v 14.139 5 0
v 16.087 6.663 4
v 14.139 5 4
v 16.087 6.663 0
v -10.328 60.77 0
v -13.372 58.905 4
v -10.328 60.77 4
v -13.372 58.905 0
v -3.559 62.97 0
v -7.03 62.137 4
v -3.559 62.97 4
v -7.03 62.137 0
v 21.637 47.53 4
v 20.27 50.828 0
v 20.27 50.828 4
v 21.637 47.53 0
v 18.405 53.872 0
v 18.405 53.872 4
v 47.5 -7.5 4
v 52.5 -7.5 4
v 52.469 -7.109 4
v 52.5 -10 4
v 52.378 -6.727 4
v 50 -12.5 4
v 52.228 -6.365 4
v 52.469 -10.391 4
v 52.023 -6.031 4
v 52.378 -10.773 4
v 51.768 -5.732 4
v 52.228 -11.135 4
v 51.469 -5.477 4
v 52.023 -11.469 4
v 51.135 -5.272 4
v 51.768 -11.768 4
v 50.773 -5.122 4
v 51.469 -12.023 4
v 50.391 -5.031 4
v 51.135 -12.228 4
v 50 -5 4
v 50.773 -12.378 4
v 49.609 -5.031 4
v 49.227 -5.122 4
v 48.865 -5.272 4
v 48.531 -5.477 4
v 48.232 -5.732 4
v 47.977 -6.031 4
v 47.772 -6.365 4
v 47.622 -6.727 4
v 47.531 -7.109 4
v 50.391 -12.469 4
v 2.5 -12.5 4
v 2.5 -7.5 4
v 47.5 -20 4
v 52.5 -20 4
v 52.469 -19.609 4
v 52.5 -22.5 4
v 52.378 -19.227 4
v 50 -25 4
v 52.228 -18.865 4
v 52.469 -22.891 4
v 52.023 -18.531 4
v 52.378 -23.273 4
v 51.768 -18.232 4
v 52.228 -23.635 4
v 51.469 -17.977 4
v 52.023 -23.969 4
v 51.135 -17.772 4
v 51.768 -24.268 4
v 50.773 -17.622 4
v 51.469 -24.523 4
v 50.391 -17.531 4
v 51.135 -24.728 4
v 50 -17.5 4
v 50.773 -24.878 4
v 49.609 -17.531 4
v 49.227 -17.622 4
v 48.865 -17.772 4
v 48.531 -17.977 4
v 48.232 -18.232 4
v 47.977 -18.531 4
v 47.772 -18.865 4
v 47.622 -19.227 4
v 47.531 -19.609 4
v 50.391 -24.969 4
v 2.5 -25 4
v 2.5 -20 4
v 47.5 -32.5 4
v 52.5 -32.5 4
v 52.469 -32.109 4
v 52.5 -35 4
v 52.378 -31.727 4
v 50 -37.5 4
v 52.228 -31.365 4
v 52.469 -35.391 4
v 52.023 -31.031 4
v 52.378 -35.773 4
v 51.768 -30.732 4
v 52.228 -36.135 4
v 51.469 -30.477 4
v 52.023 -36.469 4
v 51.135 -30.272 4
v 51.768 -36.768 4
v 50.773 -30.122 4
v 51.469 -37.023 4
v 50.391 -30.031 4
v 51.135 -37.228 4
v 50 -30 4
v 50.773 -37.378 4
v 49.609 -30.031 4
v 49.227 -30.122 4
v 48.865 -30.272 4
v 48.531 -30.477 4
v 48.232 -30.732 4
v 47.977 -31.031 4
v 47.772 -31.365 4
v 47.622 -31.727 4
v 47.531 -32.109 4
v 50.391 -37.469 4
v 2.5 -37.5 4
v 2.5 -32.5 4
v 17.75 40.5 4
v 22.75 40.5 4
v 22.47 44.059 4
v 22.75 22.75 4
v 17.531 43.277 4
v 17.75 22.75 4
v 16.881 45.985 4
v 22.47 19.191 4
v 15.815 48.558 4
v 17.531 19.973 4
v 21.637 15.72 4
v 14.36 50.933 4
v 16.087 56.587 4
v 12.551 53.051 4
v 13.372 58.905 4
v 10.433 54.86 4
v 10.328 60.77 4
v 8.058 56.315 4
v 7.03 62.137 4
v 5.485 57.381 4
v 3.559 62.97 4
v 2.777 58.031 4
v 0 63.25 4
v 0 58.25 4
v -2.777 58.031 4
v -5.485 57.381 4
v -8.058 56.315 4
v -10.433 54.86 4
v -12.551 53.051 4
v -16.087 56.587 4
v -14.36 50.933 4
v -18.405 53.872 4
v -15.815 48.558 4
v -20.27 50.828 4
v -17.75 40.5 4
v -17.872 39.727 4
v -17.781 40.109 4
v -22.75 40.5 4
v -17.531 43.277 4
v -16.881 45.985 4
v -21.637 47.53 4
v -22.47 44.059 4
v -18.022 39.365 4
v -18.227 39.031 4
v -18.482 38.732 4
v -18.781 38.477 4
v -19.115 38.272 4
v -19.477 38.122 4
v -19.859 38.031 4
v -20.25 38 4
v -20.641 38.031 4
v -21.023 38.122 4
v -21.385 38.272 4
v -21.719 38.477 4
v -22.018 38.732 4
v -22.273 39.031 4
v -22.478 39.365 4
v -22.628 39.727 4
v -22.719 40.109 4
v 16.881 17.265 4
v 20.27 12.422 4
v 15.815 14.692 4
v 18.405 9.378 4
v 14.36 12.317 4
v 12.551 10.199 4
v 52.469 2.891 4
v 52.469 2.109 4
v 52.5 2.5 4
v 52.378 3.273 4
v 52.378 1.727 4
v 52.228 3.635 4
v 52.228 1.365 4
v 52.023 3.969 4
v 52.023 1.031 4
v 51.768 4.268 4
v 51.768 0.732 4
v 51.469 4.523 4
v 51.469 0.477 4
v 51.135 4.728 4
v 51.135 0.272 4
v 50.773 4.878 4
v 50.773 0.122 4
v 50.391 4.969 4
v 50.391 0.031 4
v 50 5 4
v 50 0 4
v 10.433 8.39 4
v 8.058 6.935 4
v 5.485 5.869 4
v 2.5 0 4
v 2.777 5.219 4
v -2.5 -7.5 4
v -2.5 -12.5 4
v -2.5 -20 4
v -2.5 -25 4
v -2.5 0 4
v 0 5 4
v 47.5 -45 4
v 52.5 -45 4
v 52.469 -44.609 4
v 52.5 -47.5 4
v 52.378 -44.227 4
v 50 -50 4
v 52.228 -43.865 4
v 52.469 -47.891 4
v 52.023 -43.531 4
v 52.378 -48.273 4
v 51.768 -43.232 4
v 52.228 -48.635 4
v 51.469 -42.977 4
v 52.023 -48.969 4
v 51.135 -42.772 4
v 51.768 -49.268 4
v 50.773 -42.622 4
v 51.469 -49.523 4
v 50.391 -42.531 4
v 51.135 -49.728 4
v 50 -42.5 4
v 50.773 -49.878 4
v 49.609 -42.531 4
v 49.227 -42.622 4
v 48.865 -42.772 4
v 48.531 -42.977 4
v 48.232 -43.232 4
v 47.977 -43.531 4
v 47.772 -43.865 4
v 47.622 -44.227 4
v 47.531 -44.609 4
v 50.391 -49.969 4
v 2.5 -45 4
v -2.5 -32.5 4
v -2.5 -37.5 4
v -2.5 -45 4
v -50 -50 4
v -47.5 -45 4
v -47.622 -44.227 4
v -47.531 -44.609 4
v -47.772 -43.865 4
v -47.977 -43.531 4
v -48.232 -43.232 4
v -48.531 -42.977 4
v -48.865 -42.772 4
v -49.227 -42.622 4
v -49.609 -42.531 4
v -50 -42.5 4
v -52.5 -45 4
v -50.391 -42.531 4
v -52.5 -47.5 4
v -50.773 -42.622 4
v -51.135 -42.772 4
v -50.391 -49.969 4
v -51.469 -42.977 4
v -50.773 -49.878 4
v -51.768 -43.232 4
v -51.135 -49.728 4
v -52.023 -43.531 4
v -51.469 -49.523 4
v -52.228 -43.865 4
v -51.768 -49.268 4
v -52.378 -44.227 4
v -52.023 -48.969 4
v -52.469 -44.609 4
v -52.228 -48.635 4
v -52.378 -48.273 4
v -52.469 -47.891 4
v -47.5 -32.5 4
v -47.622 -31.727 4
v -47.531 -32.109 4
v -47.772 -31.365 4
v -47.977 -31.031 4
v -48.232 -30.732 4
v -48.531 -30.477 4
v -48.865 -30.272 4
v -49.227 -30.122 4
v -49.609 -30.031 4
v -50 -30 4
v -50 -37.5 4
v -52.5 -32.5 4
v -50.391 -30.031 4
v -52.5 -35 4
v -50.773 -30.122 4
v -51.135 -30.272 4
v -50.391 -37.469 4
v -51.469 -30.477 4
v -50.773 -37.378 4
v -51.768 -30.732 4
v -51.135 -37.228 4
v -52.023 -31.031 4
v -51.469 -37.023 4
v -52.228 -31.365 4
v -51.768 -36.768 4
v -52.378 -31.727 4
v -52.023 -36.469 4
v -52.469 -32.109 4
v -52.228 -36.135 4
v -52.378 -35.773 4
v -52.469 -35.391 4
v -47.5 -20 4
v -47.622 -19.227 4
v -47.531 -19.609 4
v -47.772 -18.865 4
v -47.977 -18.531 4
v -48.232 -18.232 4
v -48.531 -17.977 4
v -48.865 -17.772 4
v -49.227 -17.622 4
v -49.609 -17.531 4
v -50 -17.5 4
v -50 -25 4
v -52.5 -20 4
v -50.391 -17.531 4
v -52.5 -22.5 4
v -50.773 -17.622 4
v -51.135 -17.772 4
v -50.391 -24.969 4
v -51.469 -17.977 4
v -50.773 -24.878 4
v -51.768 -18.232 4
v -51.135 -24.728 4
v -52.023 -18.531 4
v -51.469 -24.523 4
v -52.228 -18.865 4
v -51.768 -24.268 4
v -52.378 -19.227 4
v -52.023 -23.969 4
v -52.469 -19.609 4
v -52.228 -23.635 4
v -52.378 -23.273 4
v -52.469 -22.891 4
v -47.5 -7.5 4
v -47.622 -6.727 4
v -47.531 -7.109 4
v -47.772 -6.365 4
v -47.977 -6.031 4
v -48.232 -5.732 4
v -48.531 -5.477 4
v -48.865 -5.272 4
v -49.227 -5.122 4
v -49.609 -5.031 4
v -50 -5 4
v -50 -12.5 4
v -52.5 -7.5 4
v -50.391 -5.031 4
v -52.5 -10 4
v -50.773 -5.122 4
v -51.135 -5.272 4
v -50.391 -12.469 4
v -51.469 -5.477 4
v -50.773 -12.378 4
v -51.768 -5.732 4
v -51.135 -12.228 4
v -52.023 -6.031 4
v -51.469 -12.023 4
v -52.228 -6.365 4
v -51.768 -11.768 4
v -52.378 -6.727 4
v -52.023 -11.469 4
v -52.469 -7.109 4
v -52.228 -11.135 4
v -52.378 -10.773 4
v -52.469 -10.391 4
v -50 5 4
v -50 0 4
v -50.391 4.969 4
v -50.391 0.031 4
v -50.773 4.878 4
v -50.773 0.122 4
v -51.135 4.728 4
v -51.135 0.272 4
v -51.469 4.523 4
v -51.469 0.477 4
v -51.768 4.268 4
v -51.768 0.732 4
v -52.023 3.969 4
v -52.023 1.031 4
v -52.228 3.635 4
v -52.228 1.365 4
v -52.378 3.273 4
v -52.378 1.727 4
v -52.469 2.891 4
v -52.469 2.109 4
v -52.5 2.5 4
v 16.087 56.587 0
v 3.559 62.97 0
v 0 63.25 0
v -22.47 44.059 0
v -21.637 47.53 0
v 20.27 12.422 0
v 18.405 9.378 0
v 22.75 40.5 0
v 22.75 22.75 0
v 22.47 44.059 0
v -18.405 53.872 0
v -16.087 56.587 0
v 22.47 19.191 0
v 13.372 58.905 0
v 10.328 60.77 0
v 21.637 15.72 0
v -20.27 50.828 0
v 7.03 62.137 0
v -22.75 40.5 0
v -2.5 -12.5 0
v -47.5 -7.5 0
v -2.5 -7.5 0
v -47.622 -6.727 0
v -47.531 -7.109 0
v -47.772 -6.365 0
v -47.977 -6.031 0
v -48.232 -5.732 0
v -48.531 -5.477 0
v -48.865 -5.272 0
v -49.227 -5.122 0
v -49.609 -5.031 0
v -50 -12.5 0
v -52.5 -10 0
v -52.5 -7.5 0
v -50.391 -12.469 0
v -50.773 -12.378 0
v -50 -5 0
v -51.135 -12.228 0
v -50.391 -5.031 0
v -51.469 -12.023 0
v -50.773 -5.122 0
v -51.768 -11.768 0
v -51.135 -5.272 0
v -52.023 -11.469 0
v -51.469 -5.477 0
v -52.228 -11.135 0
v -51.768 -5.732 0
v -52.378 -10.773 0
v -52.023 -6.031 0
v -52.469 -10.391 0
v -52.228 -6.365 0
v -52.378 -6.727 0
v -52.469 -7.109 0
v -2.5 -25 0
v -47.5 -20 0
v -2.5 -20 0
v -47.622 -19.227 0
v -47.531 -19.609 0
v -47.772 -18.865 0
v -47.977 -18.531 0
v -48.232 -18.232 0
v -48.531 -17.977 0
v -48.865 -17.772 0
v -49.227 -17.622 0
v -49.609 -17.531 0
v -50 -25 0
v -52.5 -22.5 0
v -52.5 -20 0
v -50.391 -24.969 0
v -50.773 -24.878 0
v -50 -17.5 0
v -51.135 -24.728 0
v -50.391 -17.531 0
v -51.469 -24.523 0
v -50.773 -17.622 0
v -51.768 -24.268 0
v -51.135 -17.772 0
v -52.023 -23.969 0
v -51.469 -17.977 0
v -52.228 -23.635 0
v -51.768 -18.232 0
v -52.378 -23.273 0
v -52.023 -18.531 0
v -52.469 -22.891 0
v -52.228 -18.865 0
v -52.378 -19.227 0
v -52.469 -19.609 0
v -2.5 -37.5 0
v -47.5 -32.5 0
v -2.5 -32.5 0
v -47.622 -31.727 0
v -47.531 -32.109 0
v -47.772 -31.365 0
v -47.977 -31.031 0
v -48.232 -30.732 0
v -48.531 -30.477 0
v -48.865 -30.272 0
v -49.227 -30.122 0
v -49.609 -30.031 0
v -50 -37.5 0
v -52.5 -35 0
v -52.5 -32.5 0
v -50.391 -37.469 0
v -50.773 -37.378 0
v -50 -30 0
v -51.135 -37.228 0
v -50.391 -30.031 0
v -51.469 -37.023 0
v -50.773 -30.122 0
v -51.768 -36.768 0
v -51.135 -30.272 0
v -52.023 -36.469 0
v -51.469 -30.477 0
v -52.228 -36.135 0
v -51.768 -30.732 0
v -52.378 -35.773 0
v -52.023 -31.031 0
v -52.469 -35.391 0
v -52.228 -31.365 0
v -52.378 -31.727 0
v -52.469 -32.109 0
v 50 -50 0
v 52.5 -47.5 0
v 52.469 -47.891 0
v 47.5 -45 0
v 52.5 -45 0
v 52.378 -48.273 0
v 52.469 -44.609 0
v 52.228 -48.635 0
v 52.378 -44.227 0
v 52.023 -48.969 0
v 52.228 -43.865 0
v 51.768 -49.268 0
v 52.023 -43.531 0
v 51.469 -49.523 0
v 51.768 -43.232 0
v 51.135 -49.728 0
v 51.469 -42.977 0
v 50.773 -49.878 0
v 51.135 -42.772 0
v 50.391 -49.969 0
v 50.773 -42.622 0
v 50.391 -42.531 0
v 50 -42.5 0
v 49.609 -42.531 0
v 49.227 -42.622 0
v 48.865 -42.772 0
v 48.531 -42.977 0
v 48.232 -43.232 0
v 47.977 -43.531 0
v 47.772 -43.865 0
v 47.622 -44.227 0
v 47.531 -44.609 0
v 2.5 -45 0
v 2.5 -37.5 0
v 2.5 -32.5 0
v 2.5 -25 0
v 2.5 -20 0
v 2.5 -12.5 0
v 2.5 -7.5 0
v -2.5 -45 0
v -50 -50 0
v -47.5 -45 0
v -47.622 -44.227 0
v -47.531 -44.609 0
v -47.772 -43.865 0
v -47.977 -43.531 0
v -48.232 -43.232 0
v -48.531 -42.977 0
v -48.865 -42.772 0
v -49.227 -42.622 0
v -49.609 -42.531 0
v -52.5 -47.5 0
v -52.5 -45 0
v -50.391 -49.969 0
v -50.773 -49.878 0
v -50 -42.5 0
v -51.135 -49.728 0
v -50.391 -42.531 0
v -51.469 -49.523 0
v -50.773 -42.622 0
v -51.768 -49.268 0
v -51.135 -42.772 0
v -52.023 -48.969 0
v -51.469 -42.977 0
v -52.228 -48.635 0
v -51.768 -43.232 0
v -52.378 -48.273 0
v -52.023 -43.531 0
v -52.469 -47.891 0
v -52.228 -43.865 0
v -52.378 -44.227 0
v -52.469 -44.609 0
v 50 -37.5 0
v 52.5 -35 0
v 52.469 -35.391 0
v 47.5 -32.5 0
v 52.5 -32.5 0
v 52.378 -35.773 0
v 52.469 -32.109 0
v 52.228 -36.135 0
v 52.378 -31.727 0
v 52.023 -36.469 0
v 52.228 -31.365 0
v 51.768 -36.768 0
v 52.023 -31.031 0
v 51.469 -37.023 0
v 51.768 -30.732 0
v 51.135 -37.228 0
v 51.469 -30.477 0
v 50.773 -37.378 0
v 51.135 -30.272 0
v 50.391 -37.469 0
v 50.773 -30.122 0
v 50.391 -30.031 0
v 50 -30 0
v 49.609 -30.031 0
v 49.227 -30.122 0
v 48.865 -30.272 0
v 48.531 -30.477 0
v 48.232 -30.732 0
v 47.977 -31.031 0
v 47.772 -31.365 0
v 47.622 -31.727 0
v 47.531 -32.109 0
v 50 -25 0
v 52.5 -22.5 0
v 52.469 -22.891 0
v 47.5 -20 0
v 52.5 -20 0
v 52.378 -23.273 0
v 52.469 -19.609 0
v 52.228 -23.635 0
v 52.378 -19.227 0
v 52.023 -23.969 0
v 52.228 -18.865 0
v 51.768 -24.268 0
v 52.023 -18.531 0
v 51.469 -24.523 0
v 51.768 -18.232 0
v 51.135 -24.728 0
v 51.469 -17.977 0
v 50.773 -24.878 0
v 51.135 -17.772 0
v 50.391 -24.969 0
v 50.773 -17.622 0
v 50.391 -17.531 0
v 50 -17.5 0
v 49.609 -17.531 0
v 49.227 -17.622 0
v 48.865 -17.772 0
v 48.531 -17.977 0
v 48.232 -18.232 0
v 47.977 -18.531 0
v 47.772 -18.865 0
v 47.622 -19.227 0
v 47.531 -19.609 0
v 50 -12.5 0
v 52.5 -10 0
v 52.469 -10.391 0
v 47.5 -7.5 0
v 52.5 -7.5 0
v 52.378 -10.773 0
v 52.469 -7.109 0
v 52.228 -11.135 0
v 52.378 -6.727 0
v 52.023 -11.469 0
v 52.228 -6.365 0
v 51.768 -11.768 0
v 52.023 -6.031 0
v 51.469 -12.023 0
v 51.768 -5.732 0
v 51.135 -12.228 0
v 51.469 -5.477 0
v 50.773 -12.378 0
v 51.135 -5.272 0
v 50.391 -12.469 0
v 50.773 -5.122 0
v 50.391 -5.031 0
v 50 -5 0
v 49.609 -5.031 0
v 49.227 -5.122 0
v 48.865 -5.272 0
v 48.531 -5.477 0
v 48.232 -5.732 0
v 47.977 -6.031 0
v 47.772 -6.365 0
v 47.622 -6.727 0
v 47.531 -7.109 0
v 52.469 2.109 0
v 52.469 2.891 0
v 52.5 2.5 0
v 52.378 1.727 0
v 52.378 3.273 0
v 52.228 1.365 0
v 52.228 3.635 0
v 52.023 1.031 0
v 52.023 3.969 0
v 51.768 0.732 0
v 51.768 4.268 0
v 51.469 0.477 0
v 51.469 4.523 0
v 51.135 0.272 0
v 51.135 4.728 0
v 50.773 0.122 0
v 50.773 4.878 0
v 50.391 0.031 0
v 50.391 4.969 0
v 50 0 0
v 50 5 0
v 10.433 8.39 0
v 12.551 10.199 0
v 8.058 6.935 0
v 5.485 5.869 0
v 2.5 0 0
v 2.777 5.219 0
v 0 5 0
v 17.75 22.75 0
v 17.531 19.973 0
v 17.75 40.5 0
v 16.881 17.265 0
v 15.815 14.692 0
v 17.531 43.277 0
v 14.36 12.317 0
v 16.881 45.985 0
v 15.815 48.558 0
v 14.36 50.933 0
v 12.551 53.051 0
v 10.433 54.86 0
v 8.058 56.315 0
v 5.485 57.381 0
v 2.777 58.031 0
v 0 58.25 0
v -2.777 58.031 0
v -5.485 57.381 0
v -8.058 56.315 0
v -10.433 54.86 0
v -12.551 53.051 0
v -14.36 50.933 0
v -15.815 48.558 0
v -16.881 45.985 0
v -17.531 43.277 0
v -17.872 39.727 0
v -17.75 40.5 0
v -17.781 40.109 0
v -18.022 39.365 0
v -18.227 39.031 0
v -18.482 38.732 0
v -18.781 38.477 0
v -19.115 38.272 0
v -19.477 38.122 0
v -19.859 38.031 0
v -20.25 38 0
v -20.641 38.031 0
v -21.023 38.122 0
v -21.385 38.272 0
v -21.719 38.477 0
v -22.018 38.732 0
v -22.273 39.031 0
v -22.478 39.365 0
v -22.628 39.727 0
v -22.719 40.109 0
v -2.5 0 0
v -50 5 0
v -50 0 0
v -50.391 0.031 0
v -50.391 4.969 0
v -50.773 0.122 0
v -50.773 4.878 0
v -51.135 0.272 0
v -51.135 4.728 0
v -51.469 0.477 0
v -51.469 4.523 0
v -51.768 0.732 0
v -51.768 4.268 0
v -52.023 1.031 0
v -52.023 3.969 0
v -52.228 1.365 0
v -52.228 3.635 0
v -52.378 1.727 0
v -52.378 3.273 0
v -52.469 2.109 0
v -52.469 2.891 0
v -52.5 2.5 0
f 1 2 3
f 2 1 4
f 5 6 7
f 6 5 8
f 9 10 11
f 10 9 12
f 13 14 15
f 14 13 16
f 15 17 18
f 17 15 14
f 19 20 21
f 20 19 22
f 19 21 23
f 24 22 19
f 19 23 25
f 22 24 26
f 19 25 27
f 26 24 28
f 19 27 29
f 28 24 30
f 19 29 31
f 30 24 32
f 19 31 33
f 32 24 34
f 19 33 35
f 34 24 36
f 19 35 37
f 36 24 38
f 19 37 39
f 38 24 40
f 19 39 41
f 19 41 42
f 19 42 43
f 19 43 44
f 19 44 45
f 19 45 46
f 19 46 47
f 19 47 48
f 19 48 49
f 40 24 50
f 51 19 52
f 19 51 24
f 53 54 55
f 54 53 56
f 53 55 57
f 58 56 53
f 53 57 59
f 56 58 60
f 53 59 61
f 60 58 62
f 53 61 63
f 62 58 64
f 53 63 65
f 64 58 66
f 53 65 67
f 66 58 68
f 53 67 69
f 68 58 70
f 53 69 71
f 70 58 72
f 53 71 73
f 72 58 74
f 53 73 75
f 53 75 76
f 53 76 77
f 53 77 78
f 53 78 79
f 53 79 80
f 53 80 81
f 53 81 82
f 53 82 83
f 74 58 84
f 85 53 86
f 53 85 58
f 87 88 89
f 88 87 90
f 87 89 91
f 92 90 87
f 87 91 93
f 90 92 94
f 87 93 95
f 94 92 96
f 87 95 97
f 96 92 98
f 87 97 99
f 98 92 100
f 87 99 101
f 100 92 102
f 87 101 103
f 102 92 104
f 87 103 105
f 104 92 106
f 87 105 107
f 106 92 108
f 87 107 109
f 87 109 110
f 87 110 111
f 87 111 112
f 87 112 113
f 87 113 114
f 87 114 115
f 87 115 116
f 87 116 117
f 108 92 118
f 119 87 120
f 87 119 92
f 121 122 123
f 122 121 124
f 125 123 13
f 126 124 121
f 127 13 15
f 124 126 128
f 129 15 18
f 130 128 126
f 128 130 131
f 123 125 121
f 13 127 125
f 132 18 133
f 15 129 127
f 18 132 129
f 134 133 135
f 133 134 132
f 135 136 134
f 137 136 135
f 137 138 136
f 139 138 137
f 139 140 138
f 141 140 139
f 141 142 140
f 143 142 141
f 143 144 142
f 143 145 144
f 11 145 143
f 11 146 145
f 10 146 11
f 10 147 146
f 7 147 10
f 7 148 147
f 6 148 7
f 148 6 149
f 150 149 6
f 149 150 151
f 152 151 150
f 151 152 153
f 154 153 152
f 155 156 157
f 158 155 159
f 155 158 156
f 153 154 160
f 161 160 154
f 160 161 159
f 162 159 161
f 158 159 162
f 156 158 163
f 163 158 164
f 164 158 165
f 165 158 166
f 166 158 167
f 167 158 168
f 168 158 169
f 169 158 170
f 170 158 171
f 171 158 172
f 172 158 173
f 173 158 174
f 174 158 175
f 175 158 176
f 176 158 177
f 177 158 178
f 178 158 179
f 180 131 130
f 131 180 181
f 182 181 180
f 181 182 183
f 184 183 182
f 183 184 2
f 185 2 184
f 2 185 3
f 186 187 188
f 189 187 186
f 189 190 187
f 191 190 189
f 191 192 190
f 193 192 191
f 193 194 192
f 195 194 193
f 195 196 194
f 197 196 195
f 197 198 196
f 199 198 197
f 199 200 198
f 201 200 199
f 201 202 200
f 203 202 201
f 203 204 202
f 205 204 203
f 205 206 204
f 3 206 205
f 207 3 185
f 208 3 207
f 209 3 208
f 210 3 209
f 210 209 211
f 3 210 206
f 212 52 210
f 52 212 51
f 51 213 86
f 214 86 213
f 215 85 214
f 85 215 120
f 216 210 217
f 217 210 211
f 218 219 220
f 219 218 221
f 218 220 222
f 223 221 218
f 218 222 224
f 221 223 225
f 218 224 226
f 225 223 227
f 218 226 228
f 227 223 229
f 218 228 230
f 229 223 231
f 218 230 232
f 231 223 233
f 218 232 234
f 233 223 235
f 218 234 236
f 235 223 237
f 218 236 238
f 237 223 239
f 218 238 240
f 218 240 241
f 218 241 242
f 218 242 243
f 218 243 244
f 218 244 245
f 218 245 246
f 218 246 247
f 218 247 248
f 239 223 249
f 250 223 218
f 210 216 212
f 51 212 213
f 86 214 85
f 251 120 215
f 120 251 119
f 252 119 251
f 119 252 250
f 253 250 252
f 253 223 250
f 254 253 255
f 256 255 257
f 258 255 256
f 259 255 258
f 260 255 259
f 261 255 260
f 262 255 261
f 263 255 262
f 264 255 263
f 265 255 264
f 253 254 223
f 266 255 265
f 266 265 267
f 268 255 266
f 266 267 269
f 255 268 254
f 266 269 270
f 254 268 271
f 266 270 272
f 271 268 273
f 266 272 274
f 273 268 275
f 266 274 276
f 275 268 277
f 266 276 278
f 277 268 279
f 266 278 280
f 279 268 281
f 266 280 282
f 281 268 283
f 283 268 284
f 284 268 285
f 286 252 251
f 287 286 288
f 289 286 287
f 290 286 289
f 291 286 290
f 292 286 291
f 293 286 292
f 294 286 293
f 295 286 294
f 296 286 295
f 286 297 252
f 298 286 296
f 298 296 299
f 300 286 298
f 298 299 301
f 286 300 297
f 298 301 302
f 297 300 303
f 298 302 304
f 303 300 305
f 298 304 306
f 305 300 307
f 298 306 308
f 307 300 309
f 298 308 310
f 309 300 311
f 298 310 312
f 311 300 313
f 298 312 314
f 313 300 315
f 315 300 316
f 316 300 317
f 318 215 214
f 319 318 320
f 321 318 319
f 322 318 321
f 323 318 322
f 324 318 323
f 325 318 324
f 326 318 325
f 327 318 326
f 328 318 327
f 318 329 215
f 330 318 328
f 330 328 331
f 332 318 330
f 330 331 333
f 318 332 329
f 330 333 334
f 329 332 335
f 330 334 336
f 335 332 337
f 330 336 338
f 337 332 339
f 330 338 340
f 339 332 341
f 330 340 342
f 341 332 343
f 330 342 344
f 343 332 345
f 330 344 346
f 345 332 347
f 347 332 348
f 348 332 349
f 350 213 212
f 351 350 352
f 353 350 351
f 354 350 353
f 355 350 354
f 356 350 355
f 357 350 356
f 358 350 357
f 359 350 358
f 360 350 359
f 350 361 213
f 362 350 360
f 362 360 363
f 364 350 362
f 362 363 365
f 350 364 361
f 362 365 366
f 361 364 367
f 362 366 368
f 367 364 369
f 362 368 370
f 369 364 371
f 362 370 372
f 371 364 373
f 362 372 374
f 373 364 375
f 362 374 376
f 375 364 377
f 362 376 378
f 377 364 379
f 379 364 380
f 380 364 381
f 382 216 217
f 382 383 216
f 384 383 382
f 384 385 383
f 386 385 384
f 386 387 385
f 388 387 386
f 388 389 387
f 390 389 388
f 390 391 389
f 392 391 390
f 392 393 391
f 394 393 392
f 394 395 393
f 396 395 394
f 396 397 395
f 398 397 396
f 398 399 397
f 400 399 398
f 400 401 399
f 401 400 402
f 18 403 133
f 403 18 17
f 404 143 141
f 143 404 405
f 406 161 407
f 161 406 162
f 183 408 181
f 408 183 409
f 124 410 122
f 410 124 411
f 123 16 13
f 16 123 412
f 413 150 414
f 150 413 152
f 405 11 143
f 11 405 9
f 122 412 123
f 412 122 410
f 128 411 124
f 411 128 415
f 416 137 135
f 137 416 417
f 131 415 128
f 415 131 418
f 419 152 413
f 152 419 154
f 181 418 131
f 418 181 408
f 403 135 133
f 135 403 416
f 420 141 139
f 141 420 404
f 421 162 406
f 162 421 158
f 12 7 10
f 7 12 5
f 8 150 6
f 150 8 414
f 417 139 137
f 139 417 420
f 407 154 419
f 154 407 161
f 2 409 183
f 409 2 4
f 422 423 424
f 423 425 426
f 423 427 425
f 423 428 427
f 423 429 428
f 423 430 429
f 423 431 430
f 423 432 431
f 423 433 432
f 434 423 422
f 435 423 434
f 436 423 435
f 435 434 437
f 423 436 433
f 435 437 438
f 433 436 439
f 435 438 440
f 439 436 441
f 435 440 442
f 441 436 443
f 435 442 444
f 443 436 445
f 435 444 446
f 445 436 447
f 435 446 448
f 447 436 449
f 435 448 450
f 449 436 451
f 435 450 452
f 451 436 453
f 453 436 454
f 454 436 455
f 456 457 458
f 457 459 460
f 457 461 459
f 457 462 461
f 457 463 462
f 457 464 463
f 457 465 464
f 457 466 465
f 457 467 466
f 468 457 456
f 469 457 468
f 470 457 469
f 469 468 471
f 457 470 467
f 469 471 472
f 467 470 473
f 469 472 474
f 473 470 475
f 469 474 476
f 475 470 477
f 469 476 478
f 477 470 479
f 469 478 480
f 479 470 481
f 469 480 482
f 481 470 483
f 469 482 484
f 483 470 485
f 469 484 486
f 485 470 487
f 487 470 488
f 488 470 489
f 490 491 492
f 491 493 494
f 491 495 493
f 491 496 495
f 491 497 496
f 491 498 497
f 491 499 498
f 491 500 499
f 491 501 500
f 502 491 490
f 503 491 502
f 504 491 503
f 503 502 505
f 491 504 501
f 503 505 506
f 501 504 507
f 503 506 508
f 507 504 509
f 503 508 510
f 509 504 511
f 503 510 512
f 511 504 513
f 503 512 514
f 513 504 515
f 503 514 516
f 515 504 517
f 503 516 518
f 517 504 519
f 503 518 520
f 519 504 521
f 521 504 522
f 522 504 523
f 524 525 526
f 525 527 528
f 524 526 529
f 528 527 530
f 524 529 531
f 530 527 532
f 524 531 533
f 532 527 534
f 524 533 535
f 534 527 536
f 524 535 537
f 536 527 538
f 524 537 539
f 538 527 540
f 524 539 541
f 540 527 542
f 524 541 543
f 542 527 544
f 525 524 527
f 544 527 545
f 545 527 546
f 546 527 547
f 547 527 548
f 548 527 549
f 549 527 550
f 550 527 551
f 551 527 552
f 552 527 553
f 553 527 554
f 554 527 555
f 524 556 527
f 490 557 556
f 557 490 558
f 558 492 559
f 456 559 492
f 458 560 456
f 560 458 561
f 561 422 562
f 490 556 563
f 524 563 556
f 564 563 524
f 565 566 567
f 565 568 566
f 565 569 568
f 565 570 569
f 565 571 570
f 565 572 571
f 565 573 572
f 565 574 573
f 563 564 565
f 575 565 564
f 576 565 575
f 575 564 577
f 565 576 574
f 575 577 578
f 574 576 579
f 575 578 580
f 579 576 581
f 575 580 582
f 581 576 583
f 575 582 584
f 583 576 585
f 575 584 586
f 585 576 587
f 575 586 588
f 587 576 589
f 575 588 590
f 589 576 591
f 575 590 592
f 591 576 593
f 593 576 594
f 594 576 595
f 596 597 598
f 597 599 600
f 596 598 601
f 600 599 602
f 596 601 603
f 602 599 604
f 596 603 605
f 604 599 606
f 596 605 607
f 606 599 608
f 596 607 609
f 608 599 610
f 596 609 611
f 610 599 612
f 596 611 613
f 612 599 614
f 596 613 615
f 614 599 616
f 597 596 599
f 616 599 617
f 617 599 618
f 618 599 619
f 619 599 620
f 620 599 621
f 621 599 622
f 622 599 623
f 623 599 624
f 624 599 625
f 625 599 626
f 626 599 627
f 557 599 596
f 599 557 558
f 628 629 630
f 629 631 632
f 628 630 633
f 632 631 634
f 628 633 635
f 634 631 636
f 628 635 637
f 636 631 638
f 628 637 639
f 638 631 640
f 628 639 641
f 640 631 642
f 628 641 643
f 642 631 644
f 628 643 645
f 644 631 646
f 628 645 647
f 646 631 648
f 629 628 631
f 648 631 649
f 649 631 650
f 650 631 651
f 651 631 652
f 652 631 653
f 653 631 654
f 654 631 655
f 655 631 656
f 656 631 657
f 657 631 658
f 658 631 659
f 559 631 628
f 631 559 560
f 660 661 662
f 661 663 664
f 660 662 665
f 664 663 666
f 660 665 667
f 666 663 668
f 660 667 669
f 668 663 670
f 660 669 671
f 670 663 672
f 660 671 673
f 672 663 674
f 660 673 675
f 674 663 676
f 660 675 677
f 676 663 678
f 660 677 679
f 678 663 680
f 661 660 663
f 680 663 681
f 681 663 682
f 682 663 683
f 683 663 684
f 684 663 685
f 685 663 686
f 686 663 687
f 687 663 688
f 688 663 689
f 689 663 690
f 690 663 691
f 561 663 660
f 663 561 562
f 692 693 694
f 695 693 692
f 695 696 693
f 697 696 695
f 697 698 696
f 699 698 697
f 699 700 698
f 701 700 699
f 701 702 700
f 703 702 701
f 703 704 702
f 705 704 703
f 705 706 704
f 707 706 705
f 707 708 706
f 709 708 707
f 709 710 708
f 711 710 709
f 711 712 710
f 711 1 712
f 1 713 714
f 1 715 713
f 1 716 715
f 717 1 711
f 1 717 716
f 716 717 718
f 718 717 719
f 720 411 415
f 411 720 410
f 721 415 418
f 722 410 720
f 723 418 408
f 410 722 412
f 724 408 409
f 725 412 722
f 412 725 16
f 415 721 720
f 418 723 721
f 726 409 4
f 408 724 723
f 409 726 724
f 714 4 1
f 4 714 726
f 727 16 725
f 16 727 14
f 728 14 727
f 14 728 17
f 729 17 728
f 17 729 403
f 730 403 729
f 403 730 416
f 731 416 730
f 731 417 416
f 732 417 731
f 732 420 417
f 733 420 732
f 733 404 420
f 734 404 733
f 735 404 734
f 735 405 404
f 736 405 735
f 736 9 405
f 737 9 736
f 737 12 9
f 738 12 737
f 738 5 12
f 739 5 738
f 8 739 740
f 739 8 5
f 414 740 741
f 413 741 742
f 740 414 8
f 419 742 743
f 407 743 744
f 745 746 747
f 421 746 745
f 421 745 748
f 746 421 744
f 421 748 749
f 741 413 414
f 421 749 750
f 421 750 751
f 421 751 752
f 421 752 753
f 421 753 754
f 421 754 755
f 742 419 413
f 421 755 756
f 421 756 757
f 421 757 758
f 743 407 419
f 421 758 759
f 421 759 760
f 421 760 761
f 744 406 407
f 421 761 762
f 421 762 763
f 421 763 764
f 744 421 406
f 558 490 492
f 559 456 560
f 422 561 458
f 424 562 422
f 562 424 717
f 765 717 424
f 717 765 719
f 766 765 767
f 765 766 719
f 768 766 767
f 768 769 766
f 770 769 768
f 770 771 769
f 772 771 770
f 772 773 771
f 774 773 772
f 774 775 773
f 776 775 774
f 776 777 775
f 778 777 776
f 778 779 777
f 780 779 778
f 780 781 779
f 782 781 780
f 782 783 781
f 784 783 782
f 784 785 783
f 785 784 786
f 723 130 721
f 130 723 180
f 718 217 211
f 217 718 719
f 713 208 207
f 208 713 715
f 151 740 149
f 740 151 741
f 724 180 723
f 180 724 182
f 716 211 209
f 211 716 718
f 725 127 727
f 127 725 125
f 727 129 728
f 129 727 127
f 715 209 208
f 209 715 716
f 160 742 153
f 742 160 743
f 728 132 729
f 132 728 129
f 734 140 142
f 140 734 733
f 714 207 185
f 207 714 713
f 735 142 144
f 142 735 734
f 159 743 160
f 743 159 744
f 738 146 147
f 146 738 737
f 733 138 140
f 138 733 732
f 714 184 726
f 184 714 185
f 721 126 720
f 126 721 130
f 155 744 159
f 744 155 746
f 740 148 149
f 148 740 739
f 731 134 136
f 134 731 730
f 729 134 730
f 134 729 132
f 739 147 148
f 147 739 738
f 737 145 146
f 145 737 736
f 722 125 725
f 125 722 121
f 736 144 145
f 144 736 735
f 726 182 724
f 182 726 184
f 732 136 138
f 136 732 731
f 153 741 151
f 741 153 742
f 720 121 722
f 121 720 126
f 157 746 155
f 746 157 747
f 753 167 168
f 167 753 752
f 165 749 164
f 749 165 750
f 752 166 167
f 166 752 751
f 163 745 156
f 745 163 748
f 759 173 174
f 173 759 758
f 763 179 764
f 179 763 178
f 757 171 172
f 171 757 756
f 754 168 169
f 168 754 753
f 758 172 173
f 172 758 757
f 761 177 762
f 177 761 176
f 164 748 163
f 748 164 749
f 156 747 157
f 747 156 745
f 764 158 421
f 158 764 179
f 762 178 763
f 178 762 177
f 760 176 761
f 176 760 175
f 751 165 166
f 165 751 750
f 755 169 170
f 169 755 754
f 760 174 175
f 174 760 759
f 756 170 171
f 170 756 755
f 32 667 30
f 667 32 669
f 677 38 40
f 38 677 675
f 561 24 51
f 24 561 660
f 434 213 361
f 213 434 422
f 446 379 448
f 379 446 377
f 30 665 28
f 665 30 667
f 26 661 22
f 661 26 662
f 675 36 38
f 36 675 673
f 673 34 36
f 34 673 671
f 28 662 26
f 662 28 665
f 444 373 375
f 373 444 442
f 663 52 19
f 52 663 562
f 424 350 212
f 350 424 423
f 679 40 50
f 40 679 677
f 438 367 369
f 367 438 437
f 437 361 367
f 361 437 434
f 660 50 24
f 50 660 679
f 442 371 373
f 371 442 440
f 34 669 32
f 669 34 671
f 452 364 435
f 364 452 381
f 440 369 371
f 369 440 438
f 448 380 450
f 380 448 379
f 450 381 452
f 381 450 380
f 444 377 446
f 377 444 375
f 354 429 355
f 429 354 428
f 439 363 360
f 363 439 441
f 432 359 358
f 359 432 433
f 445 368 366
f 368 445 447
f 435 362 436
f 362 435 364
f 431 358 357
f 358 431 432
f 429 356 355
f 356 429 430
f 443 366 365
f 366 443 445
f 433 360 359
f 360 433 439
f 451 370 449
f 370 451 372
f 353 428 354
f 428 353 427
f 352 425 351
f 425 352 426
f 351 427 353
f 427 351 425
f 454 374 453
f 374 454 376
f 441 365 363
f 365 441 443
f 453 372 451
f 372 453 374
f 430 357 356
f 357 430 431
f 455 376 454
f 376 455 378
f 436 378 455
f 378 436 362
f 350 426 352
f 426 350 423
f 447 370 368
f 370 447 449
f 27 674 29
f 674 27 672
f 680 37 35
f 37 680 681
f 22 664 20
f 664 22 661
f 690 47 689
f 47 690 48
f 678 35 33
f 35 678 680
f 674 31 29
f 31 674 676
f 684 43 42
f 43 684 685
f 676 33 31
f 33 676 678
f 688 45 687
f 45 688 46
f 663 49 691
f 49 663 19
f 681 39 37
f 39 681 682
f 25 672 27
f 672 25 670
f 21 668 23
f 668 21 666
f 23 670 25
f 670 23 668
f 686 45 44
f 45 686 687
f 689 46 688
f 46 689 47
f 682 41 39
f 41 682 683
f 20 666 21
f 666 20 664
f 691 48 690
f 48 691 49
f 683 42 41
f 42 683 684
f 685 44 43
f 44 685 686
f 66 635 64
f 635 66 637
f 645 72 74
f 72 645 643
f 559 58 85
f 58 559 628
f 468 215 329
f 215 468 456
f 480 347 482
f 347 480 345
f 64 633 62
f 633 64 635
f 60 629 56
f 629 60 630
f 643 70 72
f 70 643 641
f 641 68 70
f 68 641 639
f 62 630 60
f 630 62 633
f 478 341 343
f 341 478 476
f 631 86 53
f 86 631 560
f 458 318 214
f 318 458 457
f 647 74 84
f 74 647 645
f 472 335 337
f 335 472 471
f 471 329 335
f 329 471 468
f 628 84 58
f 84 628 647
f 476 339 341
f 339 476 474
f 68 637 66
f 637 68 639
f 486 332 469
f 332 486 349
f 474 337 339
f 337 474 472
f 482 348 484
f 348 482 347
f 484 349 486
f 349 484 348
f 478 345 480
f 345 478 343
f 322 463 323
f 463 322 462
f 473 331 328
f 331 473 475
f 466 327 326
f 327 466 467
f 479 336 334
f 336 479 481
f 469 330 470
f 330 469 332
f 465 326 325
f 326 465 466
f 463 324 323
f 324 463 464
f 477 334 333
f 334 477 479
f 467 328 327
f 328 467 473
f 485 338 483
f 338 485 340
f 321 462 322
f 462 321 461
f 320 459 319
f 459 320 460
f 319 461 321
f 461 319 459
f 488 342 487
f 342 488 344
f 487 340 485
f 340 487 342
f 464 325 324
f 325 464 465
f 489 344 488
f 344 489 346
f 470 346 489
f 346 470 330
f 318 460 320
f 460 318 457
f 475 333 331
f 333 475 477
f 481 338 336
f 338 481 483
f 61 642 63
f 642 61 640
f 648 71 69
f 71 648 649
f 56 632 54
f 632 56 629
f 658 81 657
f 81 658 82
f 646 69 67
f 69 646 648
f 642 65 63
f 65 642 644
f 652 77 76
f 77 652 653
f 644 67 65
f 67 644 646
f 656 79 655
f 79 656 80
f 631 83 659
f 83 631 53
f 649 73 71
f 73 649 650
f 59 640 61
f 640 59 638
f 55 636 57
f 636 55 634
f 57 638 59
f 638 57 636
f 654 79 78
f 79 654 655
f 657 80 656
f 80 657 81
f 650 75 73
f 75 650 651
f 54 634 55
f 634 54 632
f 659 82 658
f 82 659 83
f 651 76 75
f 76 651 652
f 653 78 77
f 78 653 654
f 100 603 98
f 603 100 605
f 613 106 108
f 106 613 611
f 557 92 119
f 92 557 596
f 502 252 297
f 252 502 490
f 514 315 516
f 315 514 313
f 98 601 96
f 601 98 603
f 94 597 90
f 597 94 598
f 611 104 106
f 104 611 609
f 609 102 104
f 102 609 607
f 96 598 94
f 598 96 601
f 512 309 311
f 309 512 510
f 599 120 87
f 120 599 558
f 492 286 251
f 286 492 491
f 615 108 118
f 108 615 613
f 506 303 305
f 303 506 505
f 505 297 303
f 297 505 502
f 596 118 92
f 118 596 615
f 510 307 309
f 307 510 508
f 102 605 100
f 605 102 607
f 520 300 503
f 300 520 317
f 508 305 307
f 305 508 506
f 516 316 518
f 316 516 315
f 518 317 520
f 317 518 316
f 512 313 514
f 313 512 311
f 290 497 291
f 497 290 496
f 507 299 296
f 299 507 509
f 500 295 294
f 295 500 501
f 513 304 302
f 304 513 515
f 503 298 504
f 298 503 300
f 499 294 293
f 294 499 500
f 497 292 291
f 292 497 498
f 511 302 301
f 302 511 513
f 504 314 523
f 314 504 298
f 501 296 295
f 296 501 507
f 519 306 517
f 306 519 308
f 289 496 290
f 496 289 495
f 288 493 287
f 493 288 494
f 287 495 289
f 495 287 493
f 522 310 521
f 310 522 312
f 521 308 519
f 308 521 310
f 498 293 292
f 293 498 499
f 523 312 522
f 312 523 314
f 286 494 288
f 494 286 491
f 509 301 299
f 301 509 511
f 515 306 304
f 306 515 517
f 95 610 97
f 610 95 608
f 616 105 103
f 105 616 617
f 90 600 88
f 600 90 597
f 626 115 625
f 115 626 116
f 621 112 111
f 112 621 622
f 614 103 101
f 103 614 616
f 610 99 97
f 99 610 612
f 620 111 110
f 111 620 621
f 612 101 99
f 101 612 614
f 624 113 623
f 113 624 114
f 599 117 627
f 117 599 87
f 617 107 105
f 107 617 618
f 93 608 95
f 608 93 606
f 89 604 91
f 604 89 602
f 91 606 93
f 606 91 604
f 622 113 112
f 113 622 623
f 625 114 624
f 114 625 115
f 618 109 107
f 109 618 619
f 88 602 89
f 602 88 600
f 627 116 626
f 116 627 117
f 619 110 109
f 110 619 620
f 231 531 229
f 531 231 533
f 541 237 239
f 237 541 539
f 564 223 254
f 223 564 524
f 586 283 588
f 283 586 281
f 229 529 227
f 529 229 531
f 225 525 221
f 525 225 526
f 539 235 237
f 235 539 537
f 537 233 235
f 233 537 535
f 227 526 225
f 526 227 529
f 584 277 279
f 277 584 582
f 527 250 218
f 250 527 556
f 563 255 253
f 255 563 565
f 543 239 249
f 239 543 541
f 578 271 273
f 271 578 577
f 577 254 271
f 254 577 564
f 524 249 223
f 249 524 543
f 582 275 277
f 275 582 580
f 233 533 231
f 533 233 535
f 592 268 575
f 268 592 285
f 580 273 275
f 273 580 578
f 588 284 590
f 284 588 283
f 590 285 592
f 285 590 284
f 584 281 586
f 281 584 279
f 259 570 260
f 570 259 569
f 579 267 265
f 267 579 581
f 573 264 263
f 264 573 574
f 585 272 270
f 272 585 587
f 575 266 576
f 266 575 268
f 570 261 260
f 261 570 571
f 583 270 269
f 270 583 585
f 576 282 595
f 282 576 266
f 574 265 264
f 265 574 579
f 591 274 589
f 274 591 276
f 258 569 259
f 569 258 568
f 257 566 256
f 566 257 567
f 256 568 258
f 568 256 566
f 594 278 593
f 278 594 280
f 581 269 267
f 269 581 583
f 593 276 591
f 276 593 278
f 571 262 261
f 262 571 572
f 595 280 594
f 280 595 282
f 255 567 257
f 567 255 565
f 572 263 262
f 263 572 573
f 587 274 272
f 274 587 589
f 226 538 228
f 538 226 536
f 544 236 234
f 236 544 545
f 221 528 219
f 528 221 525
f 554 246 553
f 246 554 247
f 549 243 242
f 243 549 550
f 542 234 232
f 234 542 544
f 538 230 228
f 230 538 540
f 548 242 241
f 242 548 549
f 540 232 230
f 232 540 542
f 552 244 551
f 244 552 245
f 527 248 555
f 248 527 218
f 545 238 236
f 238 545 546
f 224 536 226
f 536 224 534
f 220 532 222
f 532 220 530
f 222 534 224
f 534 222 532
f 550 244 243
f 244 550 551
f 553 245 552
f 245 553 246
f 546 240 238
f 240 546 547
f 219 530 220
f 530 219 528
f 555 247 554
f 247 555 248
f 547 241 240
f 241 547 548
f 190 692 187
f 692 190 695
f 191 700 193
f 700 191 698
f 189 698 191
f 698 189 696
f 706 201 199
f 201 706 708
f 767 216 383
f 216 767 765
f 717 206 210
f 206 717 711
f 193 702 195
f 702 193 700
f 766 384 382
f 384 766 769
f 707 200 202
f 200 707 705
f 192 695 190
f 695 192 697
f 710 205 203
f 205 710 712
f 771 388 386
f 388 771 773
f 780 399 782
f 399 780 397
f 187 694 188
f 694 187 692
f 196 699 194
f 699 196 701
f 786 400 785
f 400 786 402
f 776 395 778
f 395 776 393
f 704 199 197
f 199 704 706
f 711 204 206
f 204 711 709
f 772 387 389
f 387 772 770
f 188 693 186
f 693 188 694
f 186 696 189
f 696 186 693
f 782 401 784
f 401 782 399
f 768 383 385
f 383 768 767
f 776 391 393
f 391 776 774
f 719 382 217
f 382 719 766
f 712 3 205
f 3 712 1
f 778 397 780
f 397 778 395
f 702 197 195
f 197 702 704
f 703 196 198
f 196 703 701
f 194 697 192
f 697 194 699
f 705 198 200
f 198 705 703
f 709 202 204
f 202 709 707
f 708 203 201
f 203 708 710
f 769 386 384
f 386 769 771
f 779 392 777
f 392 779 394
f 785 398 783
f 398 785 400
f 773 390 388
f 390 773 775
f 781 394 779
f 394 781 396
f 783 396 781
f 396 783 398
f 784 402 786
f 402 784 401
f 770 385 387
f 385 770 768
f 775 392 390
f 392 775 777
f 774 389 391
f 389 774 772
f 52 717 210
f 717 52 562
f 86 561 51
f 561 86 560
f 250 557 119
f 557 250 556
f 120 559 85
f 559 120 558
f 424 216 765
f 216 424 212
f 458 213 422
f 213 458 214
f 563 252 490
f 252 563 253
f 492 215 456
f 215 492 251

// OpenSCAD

/* [General] */

// Thickness of the part in the Z dimension. Increase to make a sturdier part.
thickness=4; // [2:10]

// Thickness of the walls in the X and Y dimensions. Increase to make a sturdier part.
wall_thickness=5; // [3:8]


/* [Hook] */

// Inner diameter of the hook. Recommended to set this at least 0.5mm larger than the target rod.
hook_size=35.5; // [2:0.5:100]

// How much extra space to put in the hook opening. If set to 0, the opening will be exactly the same as Hook Size. Positive values will result in a larger opening, negative values will result in a smaller opening. Values lower than -(Hook Size / 2) would violate the geometry of the hook, so will automatically be changed to the lowest valid value.
hook_extra_space=0; // [-50:50]


/* [Tie Sections] */

// The number of tie rows on the hanger.
tie_count=4; // [1:20]

// Whether or not the hanger is double-sided.
double_sided=true; // [true,false]

// The width of each tie section flat area.
tie_section_width=40; // [20:60]

// The height of the hook at the end of each tie section.
tie_section_hook_height=2.5; // [1:0.5:5]

// The height of the gap above the tie section hook. Too small values will make it difficult to use.
tie_section_gap_height=5; // [1:10]

// Only works when Double Sided = true. Shift each layer of the tie section outward by this amount so that the ties are staggered.
tie_section_shift=0; // [0:50]


//Calculated
top_bar_y=wall_thickness/2;
each_bar_y_multiplier=-(wall_thickness+tie_section_hook_height+tie_section_gap_height);
tie_section_left_x=double_sided?(-(tie_section_width+wall_thickness*2)):-(tie_section_width+wall_thickness*2)/2;
tie_section_right_x=double_sided?(tie_section_width+wall_thickness*2):(tie_section_width+wall_thickness*2)/2;
real_hook_extra_space=(hook_extra_space<-(hook_size/2))?-(hook_size/2):hook_extra_space;


union() {
    // Main hook
    union() {
        
        // Hook surround
        difference() {
            // Outside
            hull() {
                // Bottom of hook should be at 0,0
                translate([0,hook_size/2+wall_thickness,0]) cylinder(d=hook_size+wall_thickness*2,h=thickness,$fn=40);
                // Top of the hook should be above
                translate([0,hook_size/2+wall_thickness+hook_size/2+real_hook_extra_space,0]) cylinder(d=hook_size+wall_thickness*2,h=thickness,$fn=40);
            }
            // Inside (subtracted)
            hull() {
                translate([0,hook_size/2+wall_thickness,0]) cylinder(d=hook_size,h=thickness*3,center=true,$fn=40);
                translate([0,hook_size/2+wall_thickness+hook_size/2+real_hook_extra_space,0]) cylinder(d=hook_size,h=thickness*3,center=true,$fn=40);
            }
            // Opening (subtracted)
            translate([-(hook_size/2+wall_thickness+1),0,-1]) cube([hook_size/2+wall_thickness+1,hook_size+wall_thickness*1+real_hook_extra_space,thickness*3]);
        }
        
        // Ball on end of hook
        translate([-(hook_size+wall_thickness)/2,(hook_size+wall_thickness+real_hook_extra_space),0]) cylinder(d=wall_thickness,h=thickness,$fn=40);
    }
    
    // Straight across top bar
    translate([0,top_bar_y,0]) {
        hull() {
            translate([tie_section_left_x,0,0]) cylinder(d=wall_thickness,h=thickness,$fn=40);
            translate([tie_section_right_x,0,0]) cylinder(d=wall_thickness,h=thickness,$fn=40);
        }
    }
    
    middle_support_x=double_sided?0:(tie_section_width+wall_thickness*2)/2;
    middle_support_left_x=double_sided?middle_support_x-tie_count*tie_section_shift:middle_support_x;
    middle_support_right_x=double_sided?middle_support_x+tie_count*tie_section_shift:middle_support_x;
    // Middle support 1 (left)
    hull() {
        translate([middle_support_x,top_bar_y,0]) cylinder(d=wall_thickness,h=thickness,$fn=40);
        translate([middle_support_left_x,top_bar_y+tie_count*each_bar_y_multiplier,0]) cylinder(d=wall_thickness,h=thickness,$fn=40);
    }
    // Middle support 2 (right)
    hull() {
        translate([middle_support_x,top_bar_y,0]) cylinder(d=wall_thickness,h=thickness,$fn=40);
        translate([middle_support_right_x,top_bar_y+tie_count*each_bar_y_multiplier,0]) cylinder(d=wall_thickness,h=thickness,$fn=40);
    }
    
    // Each tie section
    for (i = [1:tie_count]) {
        this_section_left_x=double_sided?tie_section_left_x-(i*tie_section_shift):tie_section_left_x;
        this_section_right_x=double_sided?tie_section_right_x+(i*tie_section_shift):tie_section_right_x;
        translate([0,top_bar_y + (i*each_bar_y_multiplier),0]) {
            // Cross bar for tie section
            hull() {
                translate([this_section_left_x,0,0]) cylinder(d=wall_thickness,h=thickness,$fn=40);
                translate([this_section_right_x,0,0]) cylinder(d=wall_thickness,h=thickness,$fn=40);
            }
            // Left hook
            hull() {
                translate([this_section_left_x,0,0]) cylinder(d=wall_thickness,h=thickness,$fn=40);
                translate([this_section_left_x,tie_section_hook_height,0]) cylinder(d=wall_thickness,h=thickness,$fn=40);
            }
            // Right hook
            hull() {
                translate([this_section_right_x,0,0]) cylinder(d=wall_thickness,h=thickness,$fn=40);
                translate([this_section_right_x,tie_section_hook_height,0]) cylinder(d=wall_thickness,h=thickness,$fn=40);
            }
        }
    }
}
